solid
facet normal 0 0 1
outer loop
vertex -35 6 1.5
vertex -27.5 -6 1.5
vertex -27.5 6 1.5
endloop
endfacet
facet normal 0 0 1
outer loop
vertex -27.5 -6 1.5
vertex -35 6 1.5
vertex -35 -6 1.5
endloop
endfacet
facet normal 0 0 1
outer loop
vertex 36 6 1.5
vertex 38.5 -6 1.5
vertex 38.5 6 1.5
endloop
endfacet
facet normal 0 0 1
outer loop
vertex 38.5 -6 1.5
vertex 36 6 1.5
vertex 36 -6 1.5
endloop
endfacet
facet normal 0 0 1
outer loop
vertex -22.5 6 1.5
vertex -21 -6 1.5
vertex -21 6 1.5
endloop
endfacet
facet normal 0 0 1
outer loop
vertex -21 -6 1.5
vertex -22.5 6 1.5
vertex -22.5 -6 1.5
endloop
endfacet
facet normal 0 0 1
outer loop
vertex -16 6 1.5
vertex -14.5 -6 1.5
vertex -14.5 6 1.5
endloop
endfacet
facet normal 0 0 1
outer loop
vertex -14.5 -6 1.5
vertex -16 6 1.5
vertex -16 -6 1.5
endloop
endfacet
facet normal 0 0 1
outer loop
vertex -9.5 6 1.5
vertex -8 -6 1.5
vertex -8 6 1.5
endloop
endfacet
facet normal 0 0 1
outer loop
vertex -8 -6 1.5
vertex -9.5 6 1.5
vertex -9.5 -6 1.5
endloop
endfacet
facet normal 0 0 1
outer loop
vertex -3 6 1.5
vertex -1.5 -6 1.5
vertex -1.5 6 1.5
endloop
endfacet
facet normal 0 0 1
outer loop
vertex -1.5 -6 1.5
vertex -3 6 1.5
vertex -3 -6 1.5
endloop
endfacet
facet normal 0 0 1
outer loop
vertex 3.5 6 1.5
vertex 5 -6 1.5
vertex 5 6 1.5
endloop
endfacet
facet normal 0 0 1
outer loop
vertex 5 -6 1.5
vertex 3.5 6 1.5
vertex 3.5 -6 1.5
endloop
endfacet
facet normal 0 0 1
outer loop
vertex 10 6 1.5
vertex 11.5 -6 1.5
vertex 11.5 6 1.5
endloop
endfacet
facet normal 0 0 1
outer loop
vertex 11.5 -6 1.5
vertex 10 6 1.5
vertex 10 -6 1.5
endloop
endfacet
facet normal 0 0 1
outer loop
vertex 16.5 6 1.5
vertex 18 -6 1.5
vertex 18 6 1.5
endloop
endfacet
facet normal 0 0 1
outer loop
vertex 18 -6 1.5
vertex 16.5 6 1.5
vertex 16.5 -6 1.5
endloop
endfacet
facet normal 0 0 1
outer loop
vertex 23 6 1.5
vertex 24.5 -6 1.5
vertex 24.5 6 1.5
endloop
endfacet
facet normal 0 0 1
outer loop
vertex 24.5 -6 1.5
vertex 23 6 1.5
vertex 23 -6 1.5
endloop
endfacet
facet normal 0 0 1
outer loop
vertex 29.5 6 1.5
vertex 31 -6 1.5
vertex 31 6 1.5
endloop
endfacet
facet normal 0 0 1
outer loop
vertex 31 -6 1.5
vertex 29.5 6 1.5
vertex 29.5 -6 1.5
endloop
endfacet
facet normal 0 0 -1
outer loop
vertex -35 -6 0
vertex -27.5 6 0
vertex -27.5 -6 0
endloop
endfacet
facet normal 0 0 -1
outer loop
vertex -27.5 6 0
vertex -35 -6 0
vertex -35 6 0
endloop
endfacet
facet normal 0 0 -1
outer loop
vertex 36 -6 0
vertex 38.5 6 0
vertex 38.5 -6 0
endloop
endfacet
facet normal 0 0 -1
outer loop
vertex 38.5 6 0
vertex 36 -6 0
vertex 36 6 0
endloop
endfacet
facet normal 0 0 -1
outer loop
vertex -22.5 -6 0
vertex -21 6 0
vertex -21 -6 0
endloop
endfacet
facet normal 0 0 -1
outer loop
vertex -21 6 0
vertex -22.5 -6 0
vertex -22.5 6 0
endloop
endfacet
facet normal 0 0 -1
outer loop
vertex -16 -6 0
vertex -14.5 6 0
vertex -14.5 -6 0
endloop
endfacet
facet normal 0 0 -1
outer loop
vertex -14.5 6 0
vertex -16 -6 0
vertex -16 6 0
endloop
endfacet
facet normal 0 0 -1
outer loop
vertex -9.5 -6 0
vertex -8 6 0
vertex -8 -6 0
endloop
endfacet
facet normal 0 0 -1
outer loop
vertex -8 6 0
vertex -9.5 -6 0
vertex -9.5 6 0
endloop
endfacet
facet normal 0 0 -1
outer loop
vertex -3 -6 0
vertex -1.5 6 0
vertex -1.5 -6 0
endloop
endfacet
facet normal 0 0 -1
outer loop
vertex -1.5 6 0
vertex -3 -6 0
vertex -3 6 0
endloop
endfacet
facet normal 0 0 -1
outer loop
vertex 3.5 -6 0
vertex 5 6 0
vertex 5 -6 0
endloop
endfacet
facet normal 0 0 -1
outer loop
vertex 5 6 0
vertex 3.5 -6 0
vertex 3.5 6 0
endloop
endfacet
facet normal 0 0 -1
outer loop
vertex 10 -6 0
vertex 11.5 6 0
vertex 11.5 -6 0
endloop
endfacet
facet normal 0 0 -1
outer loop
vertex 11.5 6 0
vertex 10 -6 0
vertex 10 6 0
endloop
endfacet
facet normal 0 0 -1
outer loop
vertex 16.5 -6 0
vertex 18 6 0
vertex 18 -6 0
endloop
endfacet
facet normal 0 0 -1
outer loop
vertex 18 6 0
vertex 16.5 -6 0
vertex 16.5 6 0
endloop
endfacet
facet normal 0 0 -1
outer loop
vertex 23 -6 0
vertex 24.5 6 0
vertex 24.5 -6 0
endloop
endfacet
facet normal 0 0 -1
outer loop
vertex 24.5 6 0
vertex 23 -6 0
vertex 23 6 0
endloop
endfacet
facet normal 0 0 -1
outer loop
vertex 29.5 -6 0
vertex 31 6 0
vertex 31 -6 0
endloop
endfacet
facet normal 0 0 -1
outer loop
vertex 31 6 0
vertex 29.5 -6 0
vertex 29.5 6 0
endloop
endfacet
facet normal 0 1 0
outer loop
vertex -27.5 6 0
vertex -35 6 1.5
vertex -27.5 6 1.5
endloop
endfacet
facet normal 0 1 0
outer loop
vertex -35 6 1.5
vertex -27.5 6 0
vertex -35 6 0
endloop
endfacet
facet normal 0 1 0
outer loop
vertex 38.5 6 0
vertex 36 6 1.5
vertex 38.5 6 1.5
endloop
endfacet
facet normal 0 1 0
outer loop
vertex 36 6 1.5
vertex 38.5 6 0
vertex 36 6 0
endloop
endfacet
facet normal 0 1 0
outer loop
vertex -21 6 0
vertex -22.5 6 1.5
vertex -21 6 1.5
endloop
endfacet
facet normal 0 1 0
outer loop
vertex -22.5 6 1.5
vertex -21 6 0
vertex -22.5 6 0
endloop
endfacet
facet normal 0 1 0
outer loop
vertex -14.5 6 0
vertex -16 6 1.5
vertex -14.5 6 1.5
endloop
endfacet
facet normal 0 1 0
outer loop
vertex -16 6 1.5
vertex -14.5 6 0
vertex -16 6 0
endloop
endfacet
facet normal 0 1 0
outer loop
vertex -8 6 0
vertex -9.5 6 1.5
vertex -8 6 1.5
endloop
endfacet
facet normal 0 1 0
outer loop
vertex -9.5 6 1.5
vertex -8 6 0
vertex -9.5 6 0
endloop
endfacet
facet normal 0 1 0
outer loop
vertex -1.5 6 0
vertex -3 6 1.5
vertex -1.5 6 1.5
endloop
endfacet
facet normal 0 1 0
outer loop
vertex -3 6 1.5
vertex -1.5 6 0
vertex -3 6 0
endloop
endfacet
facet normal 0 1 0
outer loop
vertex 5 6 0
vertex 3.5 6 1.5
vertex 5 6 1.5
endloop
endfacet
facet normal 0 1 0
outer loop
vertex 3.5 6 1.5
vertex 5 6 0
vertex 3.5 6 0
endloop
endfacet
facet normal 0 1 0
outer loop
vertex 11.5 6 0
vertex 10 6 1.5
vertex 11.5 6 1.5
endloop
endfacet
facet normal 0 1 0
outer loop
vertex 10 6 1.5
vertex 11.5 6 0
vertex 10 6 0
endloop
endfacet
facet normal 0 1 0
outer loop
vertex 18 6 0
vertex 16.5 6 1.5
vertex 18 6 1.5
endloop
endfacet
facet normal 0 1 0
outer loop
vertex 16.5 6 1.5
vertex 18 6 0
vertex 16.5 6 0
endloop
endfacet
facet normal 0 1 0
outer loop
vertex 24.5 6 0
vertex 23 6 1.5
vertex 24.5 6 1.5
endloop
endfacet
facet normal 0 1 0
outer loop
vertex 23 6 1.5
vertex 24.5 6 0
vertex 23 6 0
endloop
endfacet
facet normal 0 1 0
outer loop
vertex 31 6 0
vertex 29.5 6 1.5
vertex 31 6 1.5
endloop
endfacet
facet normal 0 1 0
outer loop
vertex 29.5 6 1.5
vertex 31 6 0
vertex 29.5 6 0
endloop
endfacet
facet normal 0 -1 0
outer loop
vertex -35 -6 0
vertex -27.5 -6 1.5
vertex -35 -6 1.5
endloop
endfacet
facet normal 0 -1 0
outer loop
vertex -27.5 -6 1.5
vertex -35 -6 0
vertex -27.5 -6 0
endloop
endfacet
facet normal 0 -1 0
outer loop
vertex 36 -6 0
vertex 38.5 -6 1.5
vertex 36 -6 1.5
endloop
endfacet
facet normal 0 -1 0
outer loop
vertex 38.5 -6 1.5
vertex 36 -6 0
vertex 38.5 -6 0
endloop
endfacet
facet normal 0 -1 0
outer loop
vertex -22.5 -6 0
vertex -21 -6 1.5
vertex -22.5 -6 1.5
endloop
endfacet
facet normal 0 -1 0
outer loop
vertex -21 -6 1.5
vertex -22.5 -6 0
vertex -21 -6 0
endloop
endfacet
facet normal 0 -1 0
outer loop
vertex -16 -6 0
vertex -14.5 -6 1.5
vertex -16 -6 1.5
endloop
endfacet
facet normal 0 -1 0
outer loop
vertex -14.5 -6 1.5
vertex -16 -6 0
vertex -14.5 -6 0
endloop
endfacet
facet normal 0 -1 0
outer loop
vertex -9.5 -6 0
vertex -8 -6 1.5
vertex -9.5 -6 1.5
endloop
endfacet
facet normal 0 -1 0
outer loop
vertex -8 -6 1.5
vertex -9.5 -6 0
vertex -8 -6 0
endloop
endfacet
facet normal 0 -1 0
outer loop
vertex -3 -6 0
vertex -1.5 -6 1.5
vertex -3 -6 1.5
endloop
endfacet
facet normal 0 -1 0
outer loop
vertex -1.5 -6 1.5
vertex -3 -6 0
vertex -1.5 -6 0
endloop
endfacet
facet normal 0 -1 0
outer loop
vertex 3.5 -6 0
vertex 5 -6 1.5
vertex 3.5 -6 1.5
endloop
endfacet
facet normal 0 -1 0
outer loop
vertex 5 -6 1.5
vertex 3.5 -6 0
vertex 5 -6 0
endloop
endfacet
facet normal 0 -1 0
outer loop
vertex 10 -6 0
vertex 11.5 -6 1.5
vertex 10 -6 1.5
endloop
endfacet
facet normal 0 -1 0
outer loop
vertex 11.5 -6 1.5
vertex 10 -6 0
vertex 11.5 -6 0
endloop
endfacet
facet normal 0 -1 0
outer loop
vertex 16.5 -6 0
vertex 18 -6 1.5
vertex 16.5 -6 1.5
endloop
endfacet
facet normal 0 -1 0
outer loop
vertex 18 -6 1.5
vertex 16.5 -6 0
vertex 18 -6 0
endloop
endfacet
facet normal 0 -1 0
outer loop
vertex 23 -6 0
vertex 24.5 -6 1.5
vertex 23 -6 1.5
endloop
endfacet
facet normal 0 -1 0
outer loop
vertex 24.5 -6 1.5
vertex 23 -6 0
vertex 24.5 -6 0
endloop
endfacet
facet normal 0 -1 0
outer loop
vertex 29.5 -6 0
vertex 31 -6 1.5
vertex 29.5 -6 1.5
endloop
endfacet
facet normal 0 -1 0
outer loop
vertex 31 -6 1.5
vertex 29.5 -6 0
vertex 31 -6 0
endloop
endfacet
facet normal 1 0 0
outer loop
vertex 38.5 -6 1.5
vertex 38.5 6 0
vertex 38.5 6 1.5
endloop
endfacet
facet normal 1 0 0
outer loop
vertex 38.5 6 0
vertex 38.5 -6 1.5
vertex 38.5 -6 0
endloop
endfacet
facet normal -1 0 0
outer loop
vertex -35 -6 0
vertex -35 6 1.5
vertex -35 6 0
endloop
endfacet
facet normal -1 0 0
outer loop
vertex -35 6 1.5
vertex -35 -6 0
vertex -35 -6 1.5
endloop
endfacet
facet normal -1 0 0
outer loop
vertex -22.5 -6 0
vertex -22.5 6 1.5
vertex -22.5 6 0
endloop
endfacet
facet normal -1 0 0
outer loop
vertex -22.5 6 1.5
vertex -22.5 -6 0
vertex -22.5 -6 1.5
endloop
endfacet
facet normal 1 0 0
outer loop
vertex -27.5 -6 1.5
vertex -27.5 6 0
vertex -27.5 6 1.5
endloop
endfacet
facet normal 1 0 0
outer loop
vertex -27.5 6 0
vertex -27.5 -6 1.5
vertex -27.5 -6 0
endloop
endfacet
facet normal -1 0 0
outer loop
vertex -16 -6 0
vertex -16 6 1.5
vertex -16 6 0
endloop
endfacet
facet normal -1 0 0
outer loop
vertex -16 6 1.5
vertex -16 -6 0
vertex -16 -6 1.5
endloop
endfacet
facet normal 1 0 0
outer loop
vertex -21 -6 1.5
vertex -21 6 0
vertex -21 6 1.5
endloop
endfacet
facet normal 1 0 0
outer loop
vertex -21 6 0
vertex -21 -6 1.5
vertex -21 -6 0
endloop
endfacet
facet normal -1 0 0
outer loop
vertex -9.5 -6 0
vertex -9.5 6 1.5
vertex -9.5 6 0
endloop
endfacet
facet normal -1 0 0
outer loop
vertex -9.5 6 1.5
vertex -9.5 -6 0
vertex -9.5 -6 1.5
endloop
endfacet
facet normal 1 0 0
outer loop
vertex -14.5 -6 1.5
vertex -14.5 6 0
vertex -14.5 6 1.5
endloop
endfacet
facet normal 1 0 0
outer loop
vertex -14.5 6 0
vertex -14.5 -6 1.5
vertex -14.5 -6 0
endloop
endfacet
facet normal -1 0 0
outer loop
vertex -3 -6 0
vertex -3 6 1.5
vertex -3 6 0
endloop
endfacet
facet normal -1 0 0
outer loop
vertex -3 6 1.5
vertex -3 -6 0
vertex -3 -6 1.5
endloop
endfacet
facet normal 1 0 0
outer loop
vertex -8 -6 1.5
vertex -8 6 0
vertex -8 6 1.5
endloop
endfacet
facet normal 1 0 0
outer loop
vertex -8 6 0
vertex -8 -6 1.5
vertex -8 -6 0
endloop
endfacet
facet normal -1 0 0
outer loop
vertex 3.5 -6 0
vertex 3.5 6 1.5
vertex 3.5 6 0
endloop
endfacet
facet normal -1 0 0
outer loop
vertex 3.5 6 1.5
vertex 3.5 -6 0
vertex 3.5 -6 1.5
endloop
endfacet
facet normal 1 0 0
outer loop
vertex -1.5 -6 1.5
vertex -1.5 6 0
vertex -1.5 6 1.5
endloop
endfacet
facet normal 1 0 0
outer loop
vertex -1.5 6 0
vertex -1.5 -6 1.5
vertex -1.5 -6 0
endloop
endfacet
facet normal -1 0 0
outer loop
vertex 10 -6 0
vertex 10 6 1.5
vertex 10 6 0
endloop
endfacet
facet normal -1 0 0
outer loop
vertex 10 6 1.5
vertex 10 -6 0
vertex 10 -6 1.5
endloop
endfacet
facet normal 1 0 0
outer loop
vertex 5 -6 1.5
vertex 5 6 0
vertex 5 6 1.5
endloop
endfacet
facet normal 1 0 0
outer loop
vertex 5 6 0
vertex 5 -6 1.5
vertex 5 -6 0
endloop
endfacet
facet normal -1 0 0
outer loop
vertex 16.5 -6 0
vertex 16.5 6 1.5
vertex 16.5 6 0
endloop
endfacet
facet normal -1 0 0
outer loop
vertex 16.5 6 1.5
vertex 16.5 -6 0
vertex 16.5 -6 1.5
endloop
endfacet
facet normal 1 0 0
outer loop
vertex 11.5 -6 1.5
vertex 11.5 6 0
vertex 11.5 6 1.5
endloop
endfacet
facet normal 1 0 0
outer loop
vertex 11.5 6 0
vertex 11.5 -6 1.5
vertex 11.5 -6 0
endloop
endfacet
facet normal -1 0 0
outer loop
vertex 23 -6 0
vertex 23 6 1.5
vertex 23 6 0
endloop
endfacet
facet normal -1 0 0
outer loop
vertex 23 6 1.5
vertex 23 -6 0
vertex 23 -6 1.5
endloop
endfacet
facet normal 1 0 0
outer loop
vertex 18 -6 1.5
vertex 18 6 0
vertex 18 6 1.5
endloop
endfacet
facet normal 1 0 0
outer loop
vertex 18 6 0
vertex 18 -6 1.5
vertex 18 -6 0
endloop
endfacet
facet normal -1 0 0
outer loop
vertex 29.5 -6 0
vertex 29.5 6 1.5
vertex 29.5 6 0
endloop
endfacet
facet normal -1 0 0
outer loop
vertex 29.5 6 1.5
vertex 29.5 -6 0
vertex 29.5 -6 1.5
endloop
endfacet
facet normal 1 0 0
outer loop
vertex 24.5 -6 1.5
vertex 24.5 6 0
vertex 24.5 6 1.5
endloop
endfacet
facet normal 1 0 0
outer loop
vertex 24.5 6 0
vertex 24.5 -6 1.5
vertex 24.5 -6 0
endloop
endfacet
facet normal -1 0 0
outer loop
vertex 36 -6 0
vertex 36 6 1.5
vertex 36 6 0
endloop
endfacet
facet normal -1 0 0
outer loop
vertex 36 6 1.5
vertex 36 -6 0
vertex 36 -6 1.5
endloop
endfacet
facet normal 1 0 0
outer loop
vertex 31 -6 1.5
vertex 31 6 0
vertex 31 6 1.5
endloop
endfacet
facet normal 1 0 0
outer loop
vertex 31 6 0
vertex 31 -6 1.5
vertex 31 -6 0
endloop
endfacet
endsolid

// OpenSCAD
// 10-well agarose gel comb, printed lying flat
// Units: mm

// ---------- Parameters ----------
plate_t      = 1.5;    // comb plate thickness (Z)
spine_len    = 70;     // spine length along X
spine_w      = 12;     // spine width along Y
tooth_count  = 10;     // number of teeth
tooth_w      = 5.0;    // tooth width along X
tooth_len    = 12;     // tooth length along Y (from spine edge)
tooth_gap    = 1.5;    // gap between neighbouring teeth
cut_extra    = 0.5;    // overshoot for clean boolean cuts

$fn = 64;

// ---------- Derived ----------
spine_x0 = -spine_len / 2;              // spine start in X
tooth_x0 = spine_x0 + (spine_len - tooth_count * tooth_w) / 2; // first tooth X
pitch    = tooth_w + tooth_gap;         // centre-to-centre spacing

// ---------- Model ----------
difference() {
    union() {
        // Spine (back bar)
        translate([spine_x0, -spine_w / 2, 0])
            cube([spine_len, spine_w, plate_t]);

        // Teeth hanging in -Y from the spine
        for (i = [0 : tooth_count - 1])
            translate([tooth_x0 + i * pitch, -spine_w / 2, 0])
                cube([tooth_w, tooth_len, plate_t]);
    }

    // 10 rectangular wells cut from the plate, running along X
    for (i = [0 : tooth_count - 1])
        translate([tooth_x0 + i * pitch - tooth_w / 2,
                   -spine_w / 2 - cut_extra,
                   -cut_extra])
            cube([tooth_w, tooth_len + cut_extra, plate_t + 2 * cut_extra]);
}
